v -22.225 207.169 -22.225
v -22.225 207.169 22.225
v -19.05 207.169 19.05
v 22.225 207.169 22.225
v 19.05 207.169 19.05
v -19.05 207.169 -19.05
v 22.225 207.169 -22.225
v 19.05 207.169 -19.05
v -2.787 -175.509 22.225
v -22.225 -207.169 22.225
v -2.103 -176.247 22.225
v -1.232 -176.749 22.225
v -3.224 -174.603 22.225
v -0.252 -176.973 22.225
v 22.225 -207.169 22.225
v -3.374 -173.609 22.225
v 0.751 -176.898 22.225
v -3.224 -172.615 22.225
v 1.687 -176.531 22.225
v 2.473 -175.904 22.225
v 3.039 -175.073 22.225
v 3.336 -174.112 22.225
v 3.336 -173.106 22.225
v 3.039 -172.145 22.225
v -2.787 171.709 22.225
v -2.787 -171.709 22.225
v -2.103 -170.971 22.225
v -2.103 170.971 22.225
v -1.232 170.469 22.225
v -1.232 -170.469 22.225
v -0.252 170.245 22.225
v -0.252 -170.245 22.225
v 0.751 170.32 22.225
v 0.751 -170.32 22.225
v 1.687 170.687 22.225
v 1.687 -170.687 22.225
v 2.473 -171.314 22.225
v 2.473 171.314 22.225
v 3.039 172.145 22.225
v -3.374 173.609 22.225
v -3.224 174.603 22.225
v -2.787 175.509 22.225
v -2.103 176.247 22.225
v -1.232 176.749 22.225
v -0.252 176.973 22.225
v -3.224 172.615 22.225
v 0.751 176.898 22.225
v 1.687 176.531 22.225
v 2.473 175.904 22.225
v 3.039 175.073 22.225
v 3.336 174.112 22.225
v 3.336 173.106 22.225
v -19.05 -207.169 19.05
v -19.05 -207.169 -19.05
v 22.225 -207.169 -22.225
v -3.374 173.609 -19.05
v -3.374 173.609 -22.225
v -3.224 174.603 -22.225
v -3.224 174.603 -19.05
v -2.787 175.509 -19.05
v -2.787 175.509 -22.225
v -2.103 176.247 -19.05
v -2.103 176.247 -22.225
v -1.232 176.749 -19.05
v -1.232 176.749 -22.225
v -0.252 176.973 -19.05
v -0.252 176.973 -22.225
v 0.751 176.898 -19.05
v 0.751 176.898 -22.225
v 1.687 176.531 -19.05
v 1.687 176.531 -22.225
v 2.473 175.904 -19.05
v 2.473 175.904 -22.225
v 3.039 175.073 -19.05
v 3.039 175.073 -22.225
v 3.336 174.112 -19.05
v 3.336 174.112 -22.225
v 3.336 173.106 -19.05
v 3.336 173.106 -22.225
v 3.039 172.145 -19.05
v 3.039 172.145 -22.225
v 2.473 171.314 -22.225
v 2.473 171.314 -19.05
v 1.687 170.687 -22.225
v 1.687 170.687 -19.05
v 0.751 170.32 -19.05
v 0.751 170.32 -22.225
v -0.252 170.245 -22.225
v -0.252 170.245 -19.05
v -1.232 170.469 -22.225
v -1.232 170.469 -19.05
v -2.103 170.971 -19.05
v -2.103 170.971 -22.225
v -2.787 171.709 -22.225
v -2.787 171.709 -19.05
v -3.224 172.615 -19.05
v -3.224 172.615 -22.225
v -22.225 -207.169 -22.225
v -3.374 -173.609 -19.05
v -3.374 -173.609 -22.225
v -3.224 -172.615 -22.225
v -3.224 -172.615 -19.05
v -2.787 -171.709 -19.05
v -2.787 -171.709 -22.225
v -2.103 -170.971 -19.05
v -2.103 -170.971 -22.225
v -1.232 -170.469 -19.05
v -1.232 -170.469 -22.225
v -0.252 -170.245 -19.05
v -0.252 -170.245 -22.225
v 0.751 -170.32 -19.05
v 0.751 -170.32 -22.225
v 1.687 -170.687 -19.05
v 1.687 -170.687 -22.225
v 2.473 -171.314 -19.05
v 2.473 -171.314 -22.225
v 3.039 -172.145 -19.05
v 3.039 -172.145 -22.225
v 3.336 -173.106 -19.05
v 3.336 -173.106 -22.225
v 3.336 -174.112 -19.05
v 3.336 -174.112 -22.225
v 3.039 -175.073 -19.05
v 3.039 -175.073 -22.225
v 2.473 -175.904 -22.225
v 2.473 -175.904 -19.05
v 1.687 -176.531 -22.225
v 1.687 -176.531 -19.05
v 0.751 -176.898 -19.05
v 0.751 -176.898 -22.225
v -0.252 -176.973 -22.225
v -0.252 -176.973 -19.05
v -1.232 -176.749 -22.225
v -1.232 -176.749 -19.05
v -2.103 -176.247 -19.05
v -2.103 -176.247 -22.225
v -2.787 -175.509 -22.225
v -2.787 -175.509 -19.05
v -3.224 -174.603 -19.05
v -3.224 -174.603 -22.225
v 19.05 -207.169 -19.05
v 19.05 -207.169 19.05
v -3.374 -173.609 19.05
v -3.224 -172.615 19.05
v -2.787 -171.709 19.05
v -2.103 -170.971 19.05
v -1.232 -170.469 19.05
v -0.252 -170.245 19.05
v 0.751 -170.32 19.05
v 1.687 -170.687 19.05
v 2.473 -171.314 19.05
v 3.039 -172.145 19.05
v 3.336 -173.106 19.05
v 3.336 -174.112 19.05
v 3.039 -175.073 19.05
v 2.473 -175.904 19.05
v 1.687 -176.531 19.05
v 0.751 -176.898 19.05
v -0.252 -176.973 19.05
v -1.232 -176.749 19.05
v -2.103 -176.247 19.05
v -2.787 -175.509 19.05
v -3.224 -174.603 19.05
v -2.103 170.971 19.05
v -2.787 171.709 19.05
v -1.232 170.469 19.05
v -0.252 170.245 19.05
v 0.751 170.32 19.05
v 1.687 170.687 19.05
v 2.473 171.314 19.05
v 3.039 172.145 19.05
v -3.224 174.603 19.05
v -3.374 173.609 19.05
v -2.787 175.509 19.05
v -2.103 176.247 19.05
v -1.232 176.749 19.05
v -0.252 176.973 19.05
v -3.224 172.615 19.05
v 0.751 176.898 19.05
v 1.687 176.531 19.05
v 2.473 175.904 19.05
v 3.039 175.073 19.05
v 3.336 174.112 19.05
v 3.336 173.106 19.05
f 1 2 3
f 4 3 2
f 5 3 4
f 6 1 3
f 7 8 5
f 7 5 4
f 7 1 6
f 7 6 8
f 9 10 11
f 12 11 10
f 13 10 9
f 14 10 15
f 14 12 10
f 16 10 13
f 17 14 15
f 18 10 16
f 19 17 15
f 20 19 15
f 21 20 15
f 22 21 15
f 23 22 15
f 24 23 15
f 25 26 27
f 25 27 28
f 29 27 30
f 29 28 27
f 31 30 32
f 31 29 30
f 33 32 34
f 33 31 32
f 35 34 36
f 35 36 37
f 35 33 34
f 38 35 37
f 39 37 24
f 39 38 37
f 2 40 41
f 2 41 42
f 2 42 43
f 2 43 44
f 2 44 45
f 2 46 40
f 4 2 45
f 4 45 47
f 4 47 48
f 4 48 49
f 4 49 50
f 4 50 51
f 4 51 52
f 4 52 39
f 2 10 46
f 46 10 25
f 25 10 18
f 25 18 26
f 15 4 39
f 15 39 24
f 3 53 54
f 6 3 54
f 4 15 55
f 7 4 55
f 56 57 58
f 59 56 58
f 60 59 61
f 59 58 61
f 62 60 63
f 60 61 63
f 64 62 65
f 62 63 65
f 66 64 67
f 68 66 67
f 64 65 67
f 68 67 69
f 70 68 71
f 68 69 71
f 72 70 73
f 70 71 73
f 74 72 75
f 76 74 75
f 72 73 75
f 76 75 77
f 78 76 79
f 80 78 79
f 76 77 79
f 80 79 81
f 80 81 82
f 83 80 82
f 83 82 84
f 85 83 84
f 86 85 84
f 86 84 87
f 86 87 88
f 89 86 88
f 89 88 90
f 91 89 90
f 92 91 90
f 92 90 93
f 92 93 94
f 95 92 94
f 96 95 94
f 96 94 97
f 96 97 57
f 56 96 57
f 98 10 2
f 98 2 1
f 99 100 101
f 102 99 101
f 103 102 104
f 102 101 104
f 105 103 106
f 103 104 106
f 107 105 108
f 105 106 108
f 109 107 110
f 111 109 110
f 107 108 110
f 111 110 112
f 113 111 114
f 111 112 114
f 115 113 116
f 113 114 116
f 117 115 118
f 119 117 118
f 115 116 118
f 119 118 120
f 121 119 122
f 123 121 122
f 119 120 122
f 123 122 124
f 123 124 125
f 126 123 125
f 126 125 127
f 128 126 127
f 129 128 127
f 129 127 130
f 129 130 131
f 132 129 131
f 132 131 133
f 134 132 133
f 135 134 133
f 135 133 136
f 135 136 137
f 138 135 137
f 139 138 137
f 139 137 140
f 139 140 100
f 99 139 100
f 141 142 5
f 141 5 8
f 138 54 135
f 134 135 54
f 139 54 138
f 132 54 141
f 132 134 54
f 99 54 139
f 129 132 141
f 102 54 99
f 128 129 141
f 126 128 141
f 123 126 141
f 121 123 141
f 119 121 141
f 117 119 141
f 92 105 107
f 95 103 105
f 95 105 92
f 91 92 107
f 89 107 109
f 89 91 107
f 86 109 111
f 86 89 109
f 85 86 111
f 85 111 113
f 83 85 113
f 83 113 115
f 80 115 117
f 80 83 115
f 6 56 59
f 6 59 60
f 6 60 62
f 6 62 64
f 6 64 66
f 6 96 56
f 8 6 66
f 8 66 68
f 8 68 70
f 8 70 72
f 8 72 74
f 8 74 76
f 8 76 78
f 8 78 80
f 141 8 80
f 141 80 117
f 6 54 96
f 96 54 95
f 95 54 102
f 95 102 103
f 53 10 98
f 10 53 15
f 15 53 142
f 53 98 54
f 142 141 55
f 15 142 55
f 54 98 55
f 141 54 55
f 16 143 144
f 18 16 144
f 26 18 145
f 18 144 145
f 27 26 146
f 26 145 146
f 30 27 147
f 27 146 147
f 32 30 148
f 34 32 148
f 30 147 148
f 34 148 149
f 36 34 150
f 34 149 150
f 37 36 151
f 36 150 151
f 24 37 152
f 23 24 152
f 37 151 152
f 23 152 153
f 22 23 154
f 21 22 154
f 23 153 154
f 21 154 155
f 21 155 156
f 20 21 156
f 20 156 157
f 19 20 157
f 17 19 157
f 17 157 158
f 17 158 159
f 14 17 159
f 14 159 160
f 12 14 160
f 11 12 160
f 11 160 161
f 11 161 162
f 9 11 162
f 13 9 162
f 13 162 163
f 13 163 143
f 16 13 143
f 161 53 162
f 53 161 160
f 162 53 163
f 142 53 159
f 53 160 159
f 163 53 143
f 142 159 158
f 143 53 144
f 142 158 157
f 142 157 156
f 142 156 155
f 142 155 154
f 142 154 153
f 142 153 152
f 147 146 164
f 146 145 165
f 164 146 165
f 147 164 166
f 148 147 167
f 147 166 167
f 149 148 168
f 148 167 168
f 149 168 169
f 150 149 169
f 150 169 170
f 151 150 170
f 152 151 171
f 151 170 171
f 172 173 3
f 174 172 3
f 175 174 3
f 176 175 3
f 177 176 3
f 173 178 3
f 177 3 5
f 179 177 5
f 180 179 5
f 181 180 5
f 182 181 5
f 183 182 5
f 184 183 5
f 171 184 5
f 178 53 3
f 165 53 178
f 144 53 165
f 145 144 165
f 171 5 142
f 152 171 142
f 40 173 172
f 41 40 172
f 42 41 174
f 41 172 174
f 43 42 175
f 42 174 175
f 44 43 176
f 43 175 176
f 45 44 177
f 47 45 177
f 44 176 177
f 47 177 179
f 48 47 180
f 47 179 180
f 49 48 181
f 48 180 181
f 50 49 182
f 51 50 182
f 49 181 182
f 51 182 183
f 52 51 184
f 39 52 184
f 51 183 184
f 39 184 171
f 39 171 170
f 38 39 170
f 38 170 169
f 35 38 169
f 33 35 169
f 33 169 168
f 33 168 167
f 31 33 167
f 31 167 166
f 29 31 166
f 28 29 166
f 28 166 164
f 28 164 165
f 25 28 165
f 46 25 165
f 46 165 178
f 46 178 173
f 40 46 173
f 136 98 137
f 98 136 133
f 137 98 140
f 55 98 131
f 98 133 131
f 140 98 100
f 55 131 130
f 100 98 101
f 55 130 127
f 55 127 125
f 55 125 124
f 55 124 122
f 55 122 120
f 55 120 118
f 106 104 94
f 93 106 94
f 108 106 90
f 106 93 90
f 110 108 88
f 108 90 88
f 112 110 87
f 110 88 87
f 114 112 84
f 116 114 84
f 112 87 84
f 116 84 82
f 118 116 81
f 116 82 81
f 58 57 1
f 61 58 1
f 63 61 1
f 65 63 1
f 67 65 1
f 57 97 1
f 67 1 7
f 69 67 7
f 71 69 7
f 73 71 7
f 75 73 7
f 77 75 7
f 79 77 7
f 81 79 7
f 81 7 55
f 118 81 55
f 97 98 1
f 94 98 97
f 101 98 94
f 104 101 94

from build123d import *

# Parameters (mm, degrees)
BOSS_EXTRUDE1_DEPTH              = 207.16875
BOSS_EXTRUDE1_DEPTH_BACK         = 207.16875
SKETCH1_W                        = 44.45
SKETCH1_H                        = 44.45
SKETCH1_W_2                      = 38.1
SKETCH1_H_2                      = 38.1
F_17_64_0_26563_DIAMETER_HOLE1_D = 6.747002


with BuildPart() as part:
    # Sketch1 → Boss-Extrude1 (new, two sides: drawn at the far end of the back side and taken through both)
    with BuildSketch(Plane(origin=(0, 0, 0), x_dir=(1, 0, 0), z_dir=(0, 1, 0)).offset(-BOSS_EXTRUDE1_DEPTH_BACK)):
        Rectangle(SKETCH1_W, SKETCH1_H)
        Rectangle(SKETCH1_W_2, SKETCH1_H_2, mode=Mode.SUBTRACT)
    extrude(amount=BOSS_EXTRUDE1_DEPTH + BOSS_EXTRUDE1_DEPTH_BACK)

    # 17/64 (0.26563) Diameter Hole1 (through all)
    with Locations(Plane.XY.offset(22.225)):
        with Locations((0, 173.609), (0, -173.609)):
            Hole(F_17_64_0_26563_DIAMETER_HOLE1_D / 2)


solid = part.part
